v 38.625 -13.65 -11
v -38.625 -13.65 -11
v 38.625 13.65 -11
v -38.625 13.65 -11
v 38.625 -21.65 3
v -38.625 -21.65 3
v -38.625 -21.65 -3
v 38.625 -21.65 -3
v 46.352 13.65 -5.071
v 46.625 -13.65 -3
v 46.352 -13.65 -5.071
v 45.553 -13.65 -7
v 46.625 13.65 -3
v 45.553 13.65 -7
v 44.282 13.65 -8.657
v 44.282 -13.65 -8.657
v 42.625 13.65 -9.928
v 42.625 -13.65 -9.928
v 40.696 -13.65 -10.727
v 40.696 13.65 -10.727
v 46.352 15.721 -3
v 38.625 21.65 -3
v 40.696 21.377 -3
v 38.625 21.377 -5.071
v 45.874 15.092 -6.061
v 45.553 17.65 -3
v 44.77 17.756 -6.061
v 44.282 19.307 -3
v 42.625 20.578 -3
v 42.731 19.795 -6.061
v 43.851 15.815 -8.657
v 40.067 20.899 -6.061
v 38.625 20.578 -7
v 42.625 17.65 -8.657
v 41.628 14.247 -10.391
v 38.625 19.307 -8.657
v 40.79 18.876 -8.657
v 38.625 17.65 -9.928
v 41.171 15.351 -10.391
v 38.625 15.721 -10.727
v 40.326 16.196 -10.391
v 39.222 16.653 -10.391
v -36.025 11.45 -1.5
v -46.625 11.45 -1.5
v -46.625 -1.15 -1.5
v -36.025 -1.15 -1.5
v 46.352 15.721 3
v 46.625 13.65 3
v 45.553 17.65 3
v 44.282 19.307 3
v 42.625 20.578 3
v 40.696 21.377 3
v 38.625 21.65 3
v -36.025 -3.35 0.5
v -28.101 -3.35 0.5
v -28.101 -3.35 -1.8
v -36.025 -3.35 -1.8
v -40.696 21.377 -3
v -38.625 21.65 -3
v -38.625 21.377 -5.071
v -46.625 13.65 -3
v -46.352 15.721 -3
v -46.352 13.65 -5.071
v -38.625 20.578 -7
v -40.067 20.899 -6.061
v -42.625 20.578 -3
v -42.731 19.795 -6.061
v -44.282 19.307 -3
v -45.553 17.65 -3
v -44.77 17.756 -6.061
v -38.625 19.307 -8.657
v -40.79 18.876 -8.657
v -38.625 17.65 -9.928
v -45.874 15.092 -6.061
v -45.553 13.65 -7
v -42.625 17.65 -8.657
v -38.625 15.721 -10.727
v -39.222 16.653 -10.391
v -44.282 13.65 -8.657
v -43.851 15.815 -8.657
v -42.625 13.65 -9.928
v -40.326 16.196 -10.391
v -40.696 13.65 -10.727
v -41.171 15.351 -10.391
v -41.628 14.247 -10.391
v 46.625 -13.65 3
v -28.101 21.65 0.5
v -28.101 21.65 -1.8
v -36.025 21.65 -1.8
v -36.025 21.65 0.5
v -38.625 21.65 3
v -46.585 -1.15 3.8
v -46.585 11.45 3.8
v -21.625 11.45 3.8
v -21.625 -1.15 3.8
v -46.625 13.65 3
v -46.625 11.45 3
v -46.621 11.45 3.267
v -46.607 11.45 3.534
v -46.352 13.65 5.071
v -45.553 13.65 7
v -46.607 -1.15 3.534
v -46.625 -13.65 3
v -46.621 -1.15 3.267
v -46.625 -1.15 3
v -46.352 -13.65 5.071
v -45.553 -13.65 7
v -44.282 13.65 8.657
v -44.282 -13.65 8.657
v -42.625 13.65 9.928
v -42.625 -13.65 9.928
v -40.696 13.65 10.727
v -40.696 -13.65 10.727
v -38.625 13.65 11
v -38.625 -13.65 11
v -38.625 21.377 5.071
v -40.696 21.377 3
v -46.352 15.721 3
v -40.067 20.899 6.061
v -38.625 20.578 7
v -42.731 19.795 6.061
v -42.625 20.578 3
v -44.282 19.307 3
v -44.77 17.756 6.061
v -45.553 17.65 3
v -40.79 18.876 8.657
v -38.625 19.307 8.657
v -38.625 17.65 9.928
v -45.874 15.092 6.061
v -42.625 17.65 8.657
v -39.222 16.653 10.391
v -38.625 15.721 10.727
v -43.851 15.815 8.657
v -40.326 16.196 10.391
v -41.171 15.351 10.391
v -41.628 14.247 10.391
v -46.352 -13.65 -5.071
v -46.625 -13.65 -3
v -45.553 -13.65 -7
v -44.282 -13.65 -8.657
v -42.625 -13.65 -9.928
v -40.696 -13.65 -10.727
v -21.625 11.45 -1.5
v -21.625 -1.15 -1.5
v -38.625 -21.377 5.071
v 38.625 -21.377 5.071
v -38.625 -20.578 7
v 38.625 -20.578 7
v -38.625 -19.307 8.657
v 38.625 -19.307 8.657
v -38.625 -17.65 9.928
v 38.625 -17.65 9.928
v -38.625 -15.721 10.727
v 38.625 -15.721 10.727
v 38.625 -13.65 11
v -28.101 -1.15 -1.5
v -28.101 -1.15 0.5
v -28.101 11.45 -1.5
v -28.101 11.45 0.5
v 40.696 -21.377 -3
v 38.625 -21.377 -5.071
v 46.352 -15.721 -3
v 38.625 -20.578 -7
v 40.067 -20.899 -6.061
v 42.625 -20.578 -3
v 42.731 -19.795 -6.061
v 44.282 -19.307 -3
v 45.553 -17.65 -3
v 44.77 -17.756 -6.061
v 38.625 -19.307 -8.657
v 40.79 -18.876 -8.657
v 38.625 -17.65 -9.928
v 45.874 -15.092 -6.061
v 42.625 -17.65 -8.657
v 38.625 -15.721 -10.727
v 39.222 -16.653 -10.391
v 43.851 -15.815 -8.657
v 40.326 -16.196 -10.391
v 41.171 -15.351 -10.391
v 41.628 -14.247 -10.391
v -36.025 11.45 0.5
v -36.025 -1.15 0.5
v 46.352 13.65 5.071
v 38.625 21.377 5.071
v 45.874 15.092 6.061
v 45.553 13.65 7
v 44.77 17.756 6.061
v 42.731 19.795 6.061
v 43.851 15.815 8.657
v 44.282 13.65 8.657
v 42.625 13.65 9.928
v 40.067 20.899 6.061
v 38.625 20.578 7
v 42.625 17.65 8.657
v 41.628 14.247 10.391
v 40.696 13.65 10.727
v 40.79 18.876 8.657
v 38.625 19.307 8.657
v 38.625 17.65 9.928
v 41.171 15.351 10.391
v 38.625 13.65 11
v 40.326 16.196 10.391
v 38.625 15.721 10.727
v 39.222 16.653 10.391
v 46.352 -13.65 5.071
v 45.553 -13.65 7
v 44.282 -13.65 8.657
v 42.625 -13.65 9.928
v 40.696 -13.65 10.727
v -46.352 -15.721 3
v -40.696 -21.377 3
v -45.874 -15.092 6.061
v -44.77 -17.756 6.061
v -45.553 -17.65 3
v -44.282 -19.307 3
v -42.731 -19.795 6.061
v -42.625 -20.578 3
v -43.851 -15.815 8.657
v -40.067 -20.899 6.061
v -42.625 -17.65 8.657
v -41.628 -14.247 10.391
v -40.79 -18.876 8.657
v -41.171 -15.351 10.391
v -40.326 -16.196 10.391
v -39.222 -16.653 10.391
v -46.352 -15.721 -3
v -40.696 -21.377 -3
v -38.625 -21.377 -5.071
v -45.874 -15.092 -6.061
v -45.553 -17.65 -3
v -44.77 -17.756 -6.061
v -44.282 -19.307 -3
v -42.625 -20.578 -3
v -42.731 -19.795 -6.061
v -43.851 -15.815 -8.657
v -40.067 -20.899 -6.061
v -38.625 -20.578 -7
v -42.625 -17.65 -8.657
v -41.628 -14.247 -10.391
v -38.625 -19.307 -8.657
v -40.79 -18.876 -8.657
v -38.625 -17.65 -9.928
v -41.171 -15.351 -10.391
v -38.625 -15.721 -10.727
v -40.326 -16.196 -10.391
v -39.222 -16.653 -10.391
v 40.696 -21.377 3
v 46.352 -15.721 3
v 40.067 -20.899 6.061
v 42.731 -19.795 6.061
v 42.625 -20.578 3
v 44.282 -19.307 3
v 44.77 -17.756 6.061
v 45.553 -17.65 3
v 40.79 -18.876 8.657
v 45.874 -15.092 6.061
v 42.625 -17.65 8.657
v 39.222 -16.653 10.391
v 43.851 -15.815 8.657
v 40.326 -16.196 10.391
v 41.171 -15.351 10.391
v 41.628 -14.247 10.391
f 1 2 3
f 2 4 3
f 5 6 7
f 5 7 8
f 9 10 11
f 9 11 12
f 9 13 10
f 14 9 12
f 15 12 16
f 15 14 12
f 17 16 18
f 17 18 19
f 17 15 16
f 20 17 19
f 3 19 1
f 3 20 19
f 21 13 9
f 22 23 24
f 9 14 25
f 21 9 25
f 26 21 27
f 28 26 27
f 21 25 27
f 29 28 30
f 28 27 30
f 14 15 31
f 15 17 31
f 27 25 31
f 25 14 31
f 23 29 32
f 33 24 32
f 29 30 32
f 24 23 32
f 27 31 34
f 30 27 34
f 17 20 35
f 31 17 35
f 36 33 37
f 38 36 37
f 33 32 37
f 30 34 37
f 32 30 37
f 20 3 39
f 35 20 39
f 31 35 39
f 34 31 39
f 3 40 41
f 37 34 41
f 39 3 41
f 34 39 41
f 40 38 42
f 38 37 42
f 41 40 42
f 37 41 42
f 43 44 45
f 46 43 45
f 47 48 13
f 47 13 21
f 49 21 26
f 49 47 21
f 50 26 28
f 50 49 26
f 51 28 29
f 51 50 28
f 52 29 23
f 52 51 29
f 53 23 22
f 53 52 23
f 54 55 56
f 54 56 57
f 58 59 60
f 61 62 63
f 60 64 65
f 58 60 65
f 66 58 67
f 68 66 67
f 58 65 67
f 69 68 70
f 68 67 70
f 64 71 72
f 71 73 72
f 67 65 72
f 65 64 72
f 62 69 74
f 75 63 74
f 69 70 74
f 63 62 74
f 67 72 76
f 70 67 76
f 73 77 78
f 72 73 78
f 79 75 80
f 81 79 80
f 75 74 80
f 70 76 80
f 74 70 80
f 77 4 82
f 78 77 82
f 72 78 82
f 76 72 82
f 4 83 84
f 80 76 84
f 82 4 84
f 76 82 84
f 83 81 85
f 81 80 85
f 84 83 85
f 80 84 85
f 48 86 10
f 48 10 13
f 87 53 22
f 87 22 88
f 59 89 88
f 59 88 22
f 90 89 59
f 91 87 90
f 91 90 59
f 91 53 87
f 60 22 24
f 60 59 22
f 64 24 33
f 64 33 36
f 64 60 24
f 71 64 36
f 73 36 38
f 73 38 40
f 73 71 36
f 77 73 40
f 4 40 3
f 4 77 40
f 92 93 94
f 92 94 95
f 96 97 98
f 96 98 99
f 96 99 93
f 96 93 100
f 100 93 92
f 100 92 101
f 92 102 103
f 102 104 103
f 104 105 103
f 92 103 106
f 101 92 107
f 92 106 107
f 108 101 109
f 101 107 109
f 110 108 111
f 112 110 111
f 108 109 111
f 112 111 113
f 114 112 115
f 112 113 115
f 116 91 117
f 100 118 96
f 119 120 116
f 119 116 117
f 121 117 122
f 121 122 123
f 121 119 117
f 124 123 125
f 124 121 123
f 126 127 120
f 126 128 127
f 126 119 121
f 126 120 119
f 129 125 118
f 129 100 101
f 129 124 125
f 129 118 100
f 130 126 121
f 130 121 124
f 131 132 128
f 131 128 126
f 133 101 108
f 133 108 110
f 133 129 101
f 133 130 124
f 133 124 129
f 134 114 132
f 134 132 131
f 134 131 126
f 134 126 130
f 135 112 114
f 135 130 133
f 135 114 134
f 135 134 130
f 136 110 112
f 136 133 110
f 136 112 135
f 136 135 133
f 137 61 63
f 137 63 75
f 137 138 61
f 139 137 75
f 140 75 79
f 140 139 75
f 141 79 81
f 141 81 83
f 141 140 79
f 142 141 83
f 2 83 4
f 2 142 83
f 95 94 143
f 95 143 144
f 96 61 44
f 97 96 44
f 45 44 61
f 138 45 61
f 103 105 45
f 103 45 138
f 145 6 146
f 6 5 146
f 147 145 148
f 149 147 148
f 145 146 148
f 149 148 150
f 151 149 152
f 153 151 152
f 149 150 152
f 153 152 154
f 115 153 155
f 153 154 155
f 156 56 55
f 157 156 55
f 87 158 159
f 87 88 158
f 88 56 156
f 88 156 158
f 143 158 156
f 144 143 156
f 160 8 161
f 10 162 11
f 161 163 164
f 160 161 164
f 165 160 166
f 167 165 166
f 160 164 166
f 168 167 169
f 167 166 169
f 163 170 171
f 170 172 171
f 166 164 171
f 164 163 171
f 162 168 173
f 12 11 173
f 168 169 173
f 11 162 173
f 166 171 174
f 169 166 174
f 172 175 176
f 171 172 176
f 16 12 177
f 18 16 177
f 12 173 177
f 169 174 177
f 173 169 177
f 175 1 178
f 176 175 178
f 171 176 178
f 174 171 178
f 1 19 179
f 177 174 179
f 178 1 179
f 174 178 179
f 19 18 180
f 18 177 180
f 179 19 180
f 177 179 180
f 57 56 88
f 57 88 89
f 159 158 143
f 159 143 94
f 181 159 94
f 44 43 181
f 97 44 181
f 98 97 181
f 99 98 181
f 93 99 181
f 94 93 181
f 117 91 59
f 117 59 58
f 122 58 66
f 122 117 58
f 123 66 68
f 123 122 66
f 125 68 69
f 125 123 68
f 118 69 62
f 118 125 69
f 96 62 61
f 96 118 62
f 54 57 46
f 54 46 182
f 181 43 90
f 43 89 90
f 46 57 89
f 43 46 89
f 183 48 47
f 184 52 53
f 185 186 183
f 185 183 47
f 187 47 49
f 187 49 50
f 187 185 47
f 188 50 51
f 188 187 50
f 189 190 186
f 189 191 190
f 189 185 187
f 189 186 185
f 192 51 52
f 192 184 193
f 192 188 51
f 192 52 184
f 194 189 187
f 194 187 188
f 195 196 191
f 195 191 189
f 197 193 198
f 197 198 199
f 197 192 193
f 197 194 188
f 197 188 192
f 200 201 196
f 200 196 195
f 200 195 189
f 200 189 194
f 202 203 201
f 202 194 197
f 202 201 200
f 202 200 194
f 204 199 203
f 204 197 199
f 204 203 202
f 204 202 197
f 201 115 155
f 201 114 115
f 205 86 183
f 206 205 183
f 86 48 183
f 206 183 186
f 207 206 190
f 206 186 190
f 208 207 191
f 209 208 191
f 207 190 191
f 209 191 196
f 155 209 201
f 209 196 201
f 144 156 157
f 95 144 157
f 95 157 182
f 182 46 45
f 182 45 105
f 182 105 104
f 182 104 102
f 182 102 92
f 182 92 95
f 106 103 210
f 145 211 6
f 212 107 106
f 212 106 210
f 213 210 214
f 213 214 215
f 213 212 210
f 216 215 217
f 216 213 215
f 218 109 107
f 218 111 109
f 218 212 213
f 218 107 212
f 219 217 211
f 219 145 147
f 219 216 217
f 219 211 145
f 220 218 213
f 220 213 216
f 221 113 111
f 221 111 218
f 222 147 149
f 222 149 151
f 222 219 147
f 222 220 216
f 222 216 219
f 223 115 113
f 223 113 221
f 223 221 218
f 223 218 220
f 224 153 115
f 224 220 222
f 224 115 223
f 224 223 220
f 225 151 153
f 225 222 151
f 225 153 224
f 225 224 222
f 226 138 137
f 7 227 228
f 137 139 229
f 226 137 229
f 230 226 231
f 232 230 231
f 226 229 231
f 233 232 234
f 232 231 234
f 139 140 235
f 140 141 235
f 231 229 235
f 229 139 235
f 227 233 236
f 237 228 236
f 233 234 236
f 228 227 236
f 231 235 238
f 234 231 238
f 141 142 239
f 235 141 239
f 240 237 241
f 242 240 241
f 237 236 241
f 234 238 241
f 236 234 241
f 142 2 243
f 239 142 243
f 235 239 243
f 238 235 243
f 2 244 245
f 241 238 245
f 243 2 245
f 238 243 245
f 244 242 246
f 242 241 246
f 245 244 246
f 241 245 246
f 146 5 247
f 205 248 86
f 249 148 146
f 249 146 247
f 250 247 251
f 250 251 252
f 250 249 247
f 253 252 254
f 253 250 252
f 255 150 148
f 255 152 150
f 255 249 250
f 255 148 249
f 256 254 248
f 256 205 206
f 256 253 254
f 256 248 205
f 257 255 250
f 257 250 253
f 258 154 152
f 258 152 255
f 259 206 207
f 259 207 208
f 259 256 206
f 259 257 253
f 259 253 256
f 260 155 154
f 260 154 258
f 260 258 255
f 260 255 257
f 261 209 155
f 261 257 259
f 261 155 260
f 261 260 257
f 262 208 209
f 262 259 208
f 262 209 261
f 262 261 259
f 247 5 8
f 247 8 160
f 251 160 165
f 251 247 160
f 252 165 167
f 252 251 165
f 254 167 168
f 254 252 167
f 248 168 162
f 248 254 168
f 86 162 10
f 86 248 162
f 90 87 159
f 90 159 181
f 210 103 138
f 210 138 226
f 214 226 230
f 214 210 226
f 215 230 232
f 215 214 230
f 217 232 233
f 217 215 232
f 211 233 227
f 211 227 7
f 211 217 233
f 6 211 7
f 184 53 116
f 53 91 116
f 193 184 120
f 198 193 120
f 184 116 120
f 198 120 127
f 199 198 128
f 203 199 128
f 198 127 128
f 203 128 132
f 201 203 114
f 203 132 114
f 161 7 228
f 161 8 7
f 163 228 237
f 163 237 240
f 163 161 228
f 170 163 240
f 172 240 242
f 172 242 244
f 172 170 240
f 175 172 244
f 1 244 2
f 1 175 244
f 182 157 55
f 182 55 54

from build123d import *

# Parameters (mm, degrees)
F1_DEPTH = 11
F2_R     = 8
F3_W     = 12.6
F3_H     = 5.3
F4_DEPTH = 25
F5_W     = 7.9238843173
F5_H     = 2.3
F6_DEPTH = 25


with BuildPart() as f1:
    # F0 (on Top) → F1 (new body, symmetric)
    with BuildSketch(Plane.XY):
        with BuildLine():
            Line((-38.625, -21.65), (38.625, -21.65))
            ThreePointArc((38.625, -21.65), (44.2818542495, -19.3068542495), (46.625, -13.65))
            Line((46.625, -13.65), (46.625, 13.65))
            ThreePointArc((46.625, 13.65), (44.2818542495, 19.3068542495), (38.625, 21.65))
            Line((38.625, 21.65), (-38.625, 21.65))
            ThreePointArc((-38.625, 21.65), (-44.2818542495, 19.3068542495), (-46.625, 13.65))
            Line((-46.625, 13.65), (-46.625, -13.65))
            ThreePointArc((-46.625, -13.65), (-44.2818542495, -19.3068542495), (-38.625, -21.65))
        make_face()
    extrude(amount=F1_DEPTH, both=True)

    # F2
    f2_edges = [f1.edges().sort_by_distance(p)[0] for p in [
        (0, -21.65, 11),
        (44.281854, -19.306854, 11),
        (46.625, 0, 11),
        (44.281854, 19.306854, 11),
        (0, 21.65, 11),
        (-44.281854, 19.306854, 11),
        (-46.625, 0, 11),
        (-44.281854, -19.306854, 11),
        (0, -21.65, -11),
        (44.281854, -19.306854, -11),
        (46.625, 0, -11),
        (44.281854, 19.306854, -11),
        (0, 21.65, -11),
        (-44.281854, 19.306854, -11),
        (-46.625, 0, -11),
        (-44.281854, -19.306854, -11),
    ]]
    fillet(f2_edges, radius=F2_R)

    # F3 (on face) → F4 (cut)
    with BuildSketch(Plane(origin=(-46.625, 0, 0), x_dir=(0, -1, 0), z_dir=(-1, 0, 0))):
        with Locations((-5.15, 1.15)):
            Rectangle(F3_W, F3_H)
    extrude(amount=-F4_DEPTH, mode=Mode.SUBTRACT)

    # F5 (on face) → F6 (cut)
    with BuildSketch(Plane(origin=(0, 21.65, 0), x_dir=(-1, 0, 0), z_dir=(0, 1, 0))):
        with Locations((32.0630578414, -0.65)):
            Rectangle(F5_W, F5_H)
    extrude(amount=-F6_DEPTH, mode=Mode.SUBTRACT)


solid = f1.part
